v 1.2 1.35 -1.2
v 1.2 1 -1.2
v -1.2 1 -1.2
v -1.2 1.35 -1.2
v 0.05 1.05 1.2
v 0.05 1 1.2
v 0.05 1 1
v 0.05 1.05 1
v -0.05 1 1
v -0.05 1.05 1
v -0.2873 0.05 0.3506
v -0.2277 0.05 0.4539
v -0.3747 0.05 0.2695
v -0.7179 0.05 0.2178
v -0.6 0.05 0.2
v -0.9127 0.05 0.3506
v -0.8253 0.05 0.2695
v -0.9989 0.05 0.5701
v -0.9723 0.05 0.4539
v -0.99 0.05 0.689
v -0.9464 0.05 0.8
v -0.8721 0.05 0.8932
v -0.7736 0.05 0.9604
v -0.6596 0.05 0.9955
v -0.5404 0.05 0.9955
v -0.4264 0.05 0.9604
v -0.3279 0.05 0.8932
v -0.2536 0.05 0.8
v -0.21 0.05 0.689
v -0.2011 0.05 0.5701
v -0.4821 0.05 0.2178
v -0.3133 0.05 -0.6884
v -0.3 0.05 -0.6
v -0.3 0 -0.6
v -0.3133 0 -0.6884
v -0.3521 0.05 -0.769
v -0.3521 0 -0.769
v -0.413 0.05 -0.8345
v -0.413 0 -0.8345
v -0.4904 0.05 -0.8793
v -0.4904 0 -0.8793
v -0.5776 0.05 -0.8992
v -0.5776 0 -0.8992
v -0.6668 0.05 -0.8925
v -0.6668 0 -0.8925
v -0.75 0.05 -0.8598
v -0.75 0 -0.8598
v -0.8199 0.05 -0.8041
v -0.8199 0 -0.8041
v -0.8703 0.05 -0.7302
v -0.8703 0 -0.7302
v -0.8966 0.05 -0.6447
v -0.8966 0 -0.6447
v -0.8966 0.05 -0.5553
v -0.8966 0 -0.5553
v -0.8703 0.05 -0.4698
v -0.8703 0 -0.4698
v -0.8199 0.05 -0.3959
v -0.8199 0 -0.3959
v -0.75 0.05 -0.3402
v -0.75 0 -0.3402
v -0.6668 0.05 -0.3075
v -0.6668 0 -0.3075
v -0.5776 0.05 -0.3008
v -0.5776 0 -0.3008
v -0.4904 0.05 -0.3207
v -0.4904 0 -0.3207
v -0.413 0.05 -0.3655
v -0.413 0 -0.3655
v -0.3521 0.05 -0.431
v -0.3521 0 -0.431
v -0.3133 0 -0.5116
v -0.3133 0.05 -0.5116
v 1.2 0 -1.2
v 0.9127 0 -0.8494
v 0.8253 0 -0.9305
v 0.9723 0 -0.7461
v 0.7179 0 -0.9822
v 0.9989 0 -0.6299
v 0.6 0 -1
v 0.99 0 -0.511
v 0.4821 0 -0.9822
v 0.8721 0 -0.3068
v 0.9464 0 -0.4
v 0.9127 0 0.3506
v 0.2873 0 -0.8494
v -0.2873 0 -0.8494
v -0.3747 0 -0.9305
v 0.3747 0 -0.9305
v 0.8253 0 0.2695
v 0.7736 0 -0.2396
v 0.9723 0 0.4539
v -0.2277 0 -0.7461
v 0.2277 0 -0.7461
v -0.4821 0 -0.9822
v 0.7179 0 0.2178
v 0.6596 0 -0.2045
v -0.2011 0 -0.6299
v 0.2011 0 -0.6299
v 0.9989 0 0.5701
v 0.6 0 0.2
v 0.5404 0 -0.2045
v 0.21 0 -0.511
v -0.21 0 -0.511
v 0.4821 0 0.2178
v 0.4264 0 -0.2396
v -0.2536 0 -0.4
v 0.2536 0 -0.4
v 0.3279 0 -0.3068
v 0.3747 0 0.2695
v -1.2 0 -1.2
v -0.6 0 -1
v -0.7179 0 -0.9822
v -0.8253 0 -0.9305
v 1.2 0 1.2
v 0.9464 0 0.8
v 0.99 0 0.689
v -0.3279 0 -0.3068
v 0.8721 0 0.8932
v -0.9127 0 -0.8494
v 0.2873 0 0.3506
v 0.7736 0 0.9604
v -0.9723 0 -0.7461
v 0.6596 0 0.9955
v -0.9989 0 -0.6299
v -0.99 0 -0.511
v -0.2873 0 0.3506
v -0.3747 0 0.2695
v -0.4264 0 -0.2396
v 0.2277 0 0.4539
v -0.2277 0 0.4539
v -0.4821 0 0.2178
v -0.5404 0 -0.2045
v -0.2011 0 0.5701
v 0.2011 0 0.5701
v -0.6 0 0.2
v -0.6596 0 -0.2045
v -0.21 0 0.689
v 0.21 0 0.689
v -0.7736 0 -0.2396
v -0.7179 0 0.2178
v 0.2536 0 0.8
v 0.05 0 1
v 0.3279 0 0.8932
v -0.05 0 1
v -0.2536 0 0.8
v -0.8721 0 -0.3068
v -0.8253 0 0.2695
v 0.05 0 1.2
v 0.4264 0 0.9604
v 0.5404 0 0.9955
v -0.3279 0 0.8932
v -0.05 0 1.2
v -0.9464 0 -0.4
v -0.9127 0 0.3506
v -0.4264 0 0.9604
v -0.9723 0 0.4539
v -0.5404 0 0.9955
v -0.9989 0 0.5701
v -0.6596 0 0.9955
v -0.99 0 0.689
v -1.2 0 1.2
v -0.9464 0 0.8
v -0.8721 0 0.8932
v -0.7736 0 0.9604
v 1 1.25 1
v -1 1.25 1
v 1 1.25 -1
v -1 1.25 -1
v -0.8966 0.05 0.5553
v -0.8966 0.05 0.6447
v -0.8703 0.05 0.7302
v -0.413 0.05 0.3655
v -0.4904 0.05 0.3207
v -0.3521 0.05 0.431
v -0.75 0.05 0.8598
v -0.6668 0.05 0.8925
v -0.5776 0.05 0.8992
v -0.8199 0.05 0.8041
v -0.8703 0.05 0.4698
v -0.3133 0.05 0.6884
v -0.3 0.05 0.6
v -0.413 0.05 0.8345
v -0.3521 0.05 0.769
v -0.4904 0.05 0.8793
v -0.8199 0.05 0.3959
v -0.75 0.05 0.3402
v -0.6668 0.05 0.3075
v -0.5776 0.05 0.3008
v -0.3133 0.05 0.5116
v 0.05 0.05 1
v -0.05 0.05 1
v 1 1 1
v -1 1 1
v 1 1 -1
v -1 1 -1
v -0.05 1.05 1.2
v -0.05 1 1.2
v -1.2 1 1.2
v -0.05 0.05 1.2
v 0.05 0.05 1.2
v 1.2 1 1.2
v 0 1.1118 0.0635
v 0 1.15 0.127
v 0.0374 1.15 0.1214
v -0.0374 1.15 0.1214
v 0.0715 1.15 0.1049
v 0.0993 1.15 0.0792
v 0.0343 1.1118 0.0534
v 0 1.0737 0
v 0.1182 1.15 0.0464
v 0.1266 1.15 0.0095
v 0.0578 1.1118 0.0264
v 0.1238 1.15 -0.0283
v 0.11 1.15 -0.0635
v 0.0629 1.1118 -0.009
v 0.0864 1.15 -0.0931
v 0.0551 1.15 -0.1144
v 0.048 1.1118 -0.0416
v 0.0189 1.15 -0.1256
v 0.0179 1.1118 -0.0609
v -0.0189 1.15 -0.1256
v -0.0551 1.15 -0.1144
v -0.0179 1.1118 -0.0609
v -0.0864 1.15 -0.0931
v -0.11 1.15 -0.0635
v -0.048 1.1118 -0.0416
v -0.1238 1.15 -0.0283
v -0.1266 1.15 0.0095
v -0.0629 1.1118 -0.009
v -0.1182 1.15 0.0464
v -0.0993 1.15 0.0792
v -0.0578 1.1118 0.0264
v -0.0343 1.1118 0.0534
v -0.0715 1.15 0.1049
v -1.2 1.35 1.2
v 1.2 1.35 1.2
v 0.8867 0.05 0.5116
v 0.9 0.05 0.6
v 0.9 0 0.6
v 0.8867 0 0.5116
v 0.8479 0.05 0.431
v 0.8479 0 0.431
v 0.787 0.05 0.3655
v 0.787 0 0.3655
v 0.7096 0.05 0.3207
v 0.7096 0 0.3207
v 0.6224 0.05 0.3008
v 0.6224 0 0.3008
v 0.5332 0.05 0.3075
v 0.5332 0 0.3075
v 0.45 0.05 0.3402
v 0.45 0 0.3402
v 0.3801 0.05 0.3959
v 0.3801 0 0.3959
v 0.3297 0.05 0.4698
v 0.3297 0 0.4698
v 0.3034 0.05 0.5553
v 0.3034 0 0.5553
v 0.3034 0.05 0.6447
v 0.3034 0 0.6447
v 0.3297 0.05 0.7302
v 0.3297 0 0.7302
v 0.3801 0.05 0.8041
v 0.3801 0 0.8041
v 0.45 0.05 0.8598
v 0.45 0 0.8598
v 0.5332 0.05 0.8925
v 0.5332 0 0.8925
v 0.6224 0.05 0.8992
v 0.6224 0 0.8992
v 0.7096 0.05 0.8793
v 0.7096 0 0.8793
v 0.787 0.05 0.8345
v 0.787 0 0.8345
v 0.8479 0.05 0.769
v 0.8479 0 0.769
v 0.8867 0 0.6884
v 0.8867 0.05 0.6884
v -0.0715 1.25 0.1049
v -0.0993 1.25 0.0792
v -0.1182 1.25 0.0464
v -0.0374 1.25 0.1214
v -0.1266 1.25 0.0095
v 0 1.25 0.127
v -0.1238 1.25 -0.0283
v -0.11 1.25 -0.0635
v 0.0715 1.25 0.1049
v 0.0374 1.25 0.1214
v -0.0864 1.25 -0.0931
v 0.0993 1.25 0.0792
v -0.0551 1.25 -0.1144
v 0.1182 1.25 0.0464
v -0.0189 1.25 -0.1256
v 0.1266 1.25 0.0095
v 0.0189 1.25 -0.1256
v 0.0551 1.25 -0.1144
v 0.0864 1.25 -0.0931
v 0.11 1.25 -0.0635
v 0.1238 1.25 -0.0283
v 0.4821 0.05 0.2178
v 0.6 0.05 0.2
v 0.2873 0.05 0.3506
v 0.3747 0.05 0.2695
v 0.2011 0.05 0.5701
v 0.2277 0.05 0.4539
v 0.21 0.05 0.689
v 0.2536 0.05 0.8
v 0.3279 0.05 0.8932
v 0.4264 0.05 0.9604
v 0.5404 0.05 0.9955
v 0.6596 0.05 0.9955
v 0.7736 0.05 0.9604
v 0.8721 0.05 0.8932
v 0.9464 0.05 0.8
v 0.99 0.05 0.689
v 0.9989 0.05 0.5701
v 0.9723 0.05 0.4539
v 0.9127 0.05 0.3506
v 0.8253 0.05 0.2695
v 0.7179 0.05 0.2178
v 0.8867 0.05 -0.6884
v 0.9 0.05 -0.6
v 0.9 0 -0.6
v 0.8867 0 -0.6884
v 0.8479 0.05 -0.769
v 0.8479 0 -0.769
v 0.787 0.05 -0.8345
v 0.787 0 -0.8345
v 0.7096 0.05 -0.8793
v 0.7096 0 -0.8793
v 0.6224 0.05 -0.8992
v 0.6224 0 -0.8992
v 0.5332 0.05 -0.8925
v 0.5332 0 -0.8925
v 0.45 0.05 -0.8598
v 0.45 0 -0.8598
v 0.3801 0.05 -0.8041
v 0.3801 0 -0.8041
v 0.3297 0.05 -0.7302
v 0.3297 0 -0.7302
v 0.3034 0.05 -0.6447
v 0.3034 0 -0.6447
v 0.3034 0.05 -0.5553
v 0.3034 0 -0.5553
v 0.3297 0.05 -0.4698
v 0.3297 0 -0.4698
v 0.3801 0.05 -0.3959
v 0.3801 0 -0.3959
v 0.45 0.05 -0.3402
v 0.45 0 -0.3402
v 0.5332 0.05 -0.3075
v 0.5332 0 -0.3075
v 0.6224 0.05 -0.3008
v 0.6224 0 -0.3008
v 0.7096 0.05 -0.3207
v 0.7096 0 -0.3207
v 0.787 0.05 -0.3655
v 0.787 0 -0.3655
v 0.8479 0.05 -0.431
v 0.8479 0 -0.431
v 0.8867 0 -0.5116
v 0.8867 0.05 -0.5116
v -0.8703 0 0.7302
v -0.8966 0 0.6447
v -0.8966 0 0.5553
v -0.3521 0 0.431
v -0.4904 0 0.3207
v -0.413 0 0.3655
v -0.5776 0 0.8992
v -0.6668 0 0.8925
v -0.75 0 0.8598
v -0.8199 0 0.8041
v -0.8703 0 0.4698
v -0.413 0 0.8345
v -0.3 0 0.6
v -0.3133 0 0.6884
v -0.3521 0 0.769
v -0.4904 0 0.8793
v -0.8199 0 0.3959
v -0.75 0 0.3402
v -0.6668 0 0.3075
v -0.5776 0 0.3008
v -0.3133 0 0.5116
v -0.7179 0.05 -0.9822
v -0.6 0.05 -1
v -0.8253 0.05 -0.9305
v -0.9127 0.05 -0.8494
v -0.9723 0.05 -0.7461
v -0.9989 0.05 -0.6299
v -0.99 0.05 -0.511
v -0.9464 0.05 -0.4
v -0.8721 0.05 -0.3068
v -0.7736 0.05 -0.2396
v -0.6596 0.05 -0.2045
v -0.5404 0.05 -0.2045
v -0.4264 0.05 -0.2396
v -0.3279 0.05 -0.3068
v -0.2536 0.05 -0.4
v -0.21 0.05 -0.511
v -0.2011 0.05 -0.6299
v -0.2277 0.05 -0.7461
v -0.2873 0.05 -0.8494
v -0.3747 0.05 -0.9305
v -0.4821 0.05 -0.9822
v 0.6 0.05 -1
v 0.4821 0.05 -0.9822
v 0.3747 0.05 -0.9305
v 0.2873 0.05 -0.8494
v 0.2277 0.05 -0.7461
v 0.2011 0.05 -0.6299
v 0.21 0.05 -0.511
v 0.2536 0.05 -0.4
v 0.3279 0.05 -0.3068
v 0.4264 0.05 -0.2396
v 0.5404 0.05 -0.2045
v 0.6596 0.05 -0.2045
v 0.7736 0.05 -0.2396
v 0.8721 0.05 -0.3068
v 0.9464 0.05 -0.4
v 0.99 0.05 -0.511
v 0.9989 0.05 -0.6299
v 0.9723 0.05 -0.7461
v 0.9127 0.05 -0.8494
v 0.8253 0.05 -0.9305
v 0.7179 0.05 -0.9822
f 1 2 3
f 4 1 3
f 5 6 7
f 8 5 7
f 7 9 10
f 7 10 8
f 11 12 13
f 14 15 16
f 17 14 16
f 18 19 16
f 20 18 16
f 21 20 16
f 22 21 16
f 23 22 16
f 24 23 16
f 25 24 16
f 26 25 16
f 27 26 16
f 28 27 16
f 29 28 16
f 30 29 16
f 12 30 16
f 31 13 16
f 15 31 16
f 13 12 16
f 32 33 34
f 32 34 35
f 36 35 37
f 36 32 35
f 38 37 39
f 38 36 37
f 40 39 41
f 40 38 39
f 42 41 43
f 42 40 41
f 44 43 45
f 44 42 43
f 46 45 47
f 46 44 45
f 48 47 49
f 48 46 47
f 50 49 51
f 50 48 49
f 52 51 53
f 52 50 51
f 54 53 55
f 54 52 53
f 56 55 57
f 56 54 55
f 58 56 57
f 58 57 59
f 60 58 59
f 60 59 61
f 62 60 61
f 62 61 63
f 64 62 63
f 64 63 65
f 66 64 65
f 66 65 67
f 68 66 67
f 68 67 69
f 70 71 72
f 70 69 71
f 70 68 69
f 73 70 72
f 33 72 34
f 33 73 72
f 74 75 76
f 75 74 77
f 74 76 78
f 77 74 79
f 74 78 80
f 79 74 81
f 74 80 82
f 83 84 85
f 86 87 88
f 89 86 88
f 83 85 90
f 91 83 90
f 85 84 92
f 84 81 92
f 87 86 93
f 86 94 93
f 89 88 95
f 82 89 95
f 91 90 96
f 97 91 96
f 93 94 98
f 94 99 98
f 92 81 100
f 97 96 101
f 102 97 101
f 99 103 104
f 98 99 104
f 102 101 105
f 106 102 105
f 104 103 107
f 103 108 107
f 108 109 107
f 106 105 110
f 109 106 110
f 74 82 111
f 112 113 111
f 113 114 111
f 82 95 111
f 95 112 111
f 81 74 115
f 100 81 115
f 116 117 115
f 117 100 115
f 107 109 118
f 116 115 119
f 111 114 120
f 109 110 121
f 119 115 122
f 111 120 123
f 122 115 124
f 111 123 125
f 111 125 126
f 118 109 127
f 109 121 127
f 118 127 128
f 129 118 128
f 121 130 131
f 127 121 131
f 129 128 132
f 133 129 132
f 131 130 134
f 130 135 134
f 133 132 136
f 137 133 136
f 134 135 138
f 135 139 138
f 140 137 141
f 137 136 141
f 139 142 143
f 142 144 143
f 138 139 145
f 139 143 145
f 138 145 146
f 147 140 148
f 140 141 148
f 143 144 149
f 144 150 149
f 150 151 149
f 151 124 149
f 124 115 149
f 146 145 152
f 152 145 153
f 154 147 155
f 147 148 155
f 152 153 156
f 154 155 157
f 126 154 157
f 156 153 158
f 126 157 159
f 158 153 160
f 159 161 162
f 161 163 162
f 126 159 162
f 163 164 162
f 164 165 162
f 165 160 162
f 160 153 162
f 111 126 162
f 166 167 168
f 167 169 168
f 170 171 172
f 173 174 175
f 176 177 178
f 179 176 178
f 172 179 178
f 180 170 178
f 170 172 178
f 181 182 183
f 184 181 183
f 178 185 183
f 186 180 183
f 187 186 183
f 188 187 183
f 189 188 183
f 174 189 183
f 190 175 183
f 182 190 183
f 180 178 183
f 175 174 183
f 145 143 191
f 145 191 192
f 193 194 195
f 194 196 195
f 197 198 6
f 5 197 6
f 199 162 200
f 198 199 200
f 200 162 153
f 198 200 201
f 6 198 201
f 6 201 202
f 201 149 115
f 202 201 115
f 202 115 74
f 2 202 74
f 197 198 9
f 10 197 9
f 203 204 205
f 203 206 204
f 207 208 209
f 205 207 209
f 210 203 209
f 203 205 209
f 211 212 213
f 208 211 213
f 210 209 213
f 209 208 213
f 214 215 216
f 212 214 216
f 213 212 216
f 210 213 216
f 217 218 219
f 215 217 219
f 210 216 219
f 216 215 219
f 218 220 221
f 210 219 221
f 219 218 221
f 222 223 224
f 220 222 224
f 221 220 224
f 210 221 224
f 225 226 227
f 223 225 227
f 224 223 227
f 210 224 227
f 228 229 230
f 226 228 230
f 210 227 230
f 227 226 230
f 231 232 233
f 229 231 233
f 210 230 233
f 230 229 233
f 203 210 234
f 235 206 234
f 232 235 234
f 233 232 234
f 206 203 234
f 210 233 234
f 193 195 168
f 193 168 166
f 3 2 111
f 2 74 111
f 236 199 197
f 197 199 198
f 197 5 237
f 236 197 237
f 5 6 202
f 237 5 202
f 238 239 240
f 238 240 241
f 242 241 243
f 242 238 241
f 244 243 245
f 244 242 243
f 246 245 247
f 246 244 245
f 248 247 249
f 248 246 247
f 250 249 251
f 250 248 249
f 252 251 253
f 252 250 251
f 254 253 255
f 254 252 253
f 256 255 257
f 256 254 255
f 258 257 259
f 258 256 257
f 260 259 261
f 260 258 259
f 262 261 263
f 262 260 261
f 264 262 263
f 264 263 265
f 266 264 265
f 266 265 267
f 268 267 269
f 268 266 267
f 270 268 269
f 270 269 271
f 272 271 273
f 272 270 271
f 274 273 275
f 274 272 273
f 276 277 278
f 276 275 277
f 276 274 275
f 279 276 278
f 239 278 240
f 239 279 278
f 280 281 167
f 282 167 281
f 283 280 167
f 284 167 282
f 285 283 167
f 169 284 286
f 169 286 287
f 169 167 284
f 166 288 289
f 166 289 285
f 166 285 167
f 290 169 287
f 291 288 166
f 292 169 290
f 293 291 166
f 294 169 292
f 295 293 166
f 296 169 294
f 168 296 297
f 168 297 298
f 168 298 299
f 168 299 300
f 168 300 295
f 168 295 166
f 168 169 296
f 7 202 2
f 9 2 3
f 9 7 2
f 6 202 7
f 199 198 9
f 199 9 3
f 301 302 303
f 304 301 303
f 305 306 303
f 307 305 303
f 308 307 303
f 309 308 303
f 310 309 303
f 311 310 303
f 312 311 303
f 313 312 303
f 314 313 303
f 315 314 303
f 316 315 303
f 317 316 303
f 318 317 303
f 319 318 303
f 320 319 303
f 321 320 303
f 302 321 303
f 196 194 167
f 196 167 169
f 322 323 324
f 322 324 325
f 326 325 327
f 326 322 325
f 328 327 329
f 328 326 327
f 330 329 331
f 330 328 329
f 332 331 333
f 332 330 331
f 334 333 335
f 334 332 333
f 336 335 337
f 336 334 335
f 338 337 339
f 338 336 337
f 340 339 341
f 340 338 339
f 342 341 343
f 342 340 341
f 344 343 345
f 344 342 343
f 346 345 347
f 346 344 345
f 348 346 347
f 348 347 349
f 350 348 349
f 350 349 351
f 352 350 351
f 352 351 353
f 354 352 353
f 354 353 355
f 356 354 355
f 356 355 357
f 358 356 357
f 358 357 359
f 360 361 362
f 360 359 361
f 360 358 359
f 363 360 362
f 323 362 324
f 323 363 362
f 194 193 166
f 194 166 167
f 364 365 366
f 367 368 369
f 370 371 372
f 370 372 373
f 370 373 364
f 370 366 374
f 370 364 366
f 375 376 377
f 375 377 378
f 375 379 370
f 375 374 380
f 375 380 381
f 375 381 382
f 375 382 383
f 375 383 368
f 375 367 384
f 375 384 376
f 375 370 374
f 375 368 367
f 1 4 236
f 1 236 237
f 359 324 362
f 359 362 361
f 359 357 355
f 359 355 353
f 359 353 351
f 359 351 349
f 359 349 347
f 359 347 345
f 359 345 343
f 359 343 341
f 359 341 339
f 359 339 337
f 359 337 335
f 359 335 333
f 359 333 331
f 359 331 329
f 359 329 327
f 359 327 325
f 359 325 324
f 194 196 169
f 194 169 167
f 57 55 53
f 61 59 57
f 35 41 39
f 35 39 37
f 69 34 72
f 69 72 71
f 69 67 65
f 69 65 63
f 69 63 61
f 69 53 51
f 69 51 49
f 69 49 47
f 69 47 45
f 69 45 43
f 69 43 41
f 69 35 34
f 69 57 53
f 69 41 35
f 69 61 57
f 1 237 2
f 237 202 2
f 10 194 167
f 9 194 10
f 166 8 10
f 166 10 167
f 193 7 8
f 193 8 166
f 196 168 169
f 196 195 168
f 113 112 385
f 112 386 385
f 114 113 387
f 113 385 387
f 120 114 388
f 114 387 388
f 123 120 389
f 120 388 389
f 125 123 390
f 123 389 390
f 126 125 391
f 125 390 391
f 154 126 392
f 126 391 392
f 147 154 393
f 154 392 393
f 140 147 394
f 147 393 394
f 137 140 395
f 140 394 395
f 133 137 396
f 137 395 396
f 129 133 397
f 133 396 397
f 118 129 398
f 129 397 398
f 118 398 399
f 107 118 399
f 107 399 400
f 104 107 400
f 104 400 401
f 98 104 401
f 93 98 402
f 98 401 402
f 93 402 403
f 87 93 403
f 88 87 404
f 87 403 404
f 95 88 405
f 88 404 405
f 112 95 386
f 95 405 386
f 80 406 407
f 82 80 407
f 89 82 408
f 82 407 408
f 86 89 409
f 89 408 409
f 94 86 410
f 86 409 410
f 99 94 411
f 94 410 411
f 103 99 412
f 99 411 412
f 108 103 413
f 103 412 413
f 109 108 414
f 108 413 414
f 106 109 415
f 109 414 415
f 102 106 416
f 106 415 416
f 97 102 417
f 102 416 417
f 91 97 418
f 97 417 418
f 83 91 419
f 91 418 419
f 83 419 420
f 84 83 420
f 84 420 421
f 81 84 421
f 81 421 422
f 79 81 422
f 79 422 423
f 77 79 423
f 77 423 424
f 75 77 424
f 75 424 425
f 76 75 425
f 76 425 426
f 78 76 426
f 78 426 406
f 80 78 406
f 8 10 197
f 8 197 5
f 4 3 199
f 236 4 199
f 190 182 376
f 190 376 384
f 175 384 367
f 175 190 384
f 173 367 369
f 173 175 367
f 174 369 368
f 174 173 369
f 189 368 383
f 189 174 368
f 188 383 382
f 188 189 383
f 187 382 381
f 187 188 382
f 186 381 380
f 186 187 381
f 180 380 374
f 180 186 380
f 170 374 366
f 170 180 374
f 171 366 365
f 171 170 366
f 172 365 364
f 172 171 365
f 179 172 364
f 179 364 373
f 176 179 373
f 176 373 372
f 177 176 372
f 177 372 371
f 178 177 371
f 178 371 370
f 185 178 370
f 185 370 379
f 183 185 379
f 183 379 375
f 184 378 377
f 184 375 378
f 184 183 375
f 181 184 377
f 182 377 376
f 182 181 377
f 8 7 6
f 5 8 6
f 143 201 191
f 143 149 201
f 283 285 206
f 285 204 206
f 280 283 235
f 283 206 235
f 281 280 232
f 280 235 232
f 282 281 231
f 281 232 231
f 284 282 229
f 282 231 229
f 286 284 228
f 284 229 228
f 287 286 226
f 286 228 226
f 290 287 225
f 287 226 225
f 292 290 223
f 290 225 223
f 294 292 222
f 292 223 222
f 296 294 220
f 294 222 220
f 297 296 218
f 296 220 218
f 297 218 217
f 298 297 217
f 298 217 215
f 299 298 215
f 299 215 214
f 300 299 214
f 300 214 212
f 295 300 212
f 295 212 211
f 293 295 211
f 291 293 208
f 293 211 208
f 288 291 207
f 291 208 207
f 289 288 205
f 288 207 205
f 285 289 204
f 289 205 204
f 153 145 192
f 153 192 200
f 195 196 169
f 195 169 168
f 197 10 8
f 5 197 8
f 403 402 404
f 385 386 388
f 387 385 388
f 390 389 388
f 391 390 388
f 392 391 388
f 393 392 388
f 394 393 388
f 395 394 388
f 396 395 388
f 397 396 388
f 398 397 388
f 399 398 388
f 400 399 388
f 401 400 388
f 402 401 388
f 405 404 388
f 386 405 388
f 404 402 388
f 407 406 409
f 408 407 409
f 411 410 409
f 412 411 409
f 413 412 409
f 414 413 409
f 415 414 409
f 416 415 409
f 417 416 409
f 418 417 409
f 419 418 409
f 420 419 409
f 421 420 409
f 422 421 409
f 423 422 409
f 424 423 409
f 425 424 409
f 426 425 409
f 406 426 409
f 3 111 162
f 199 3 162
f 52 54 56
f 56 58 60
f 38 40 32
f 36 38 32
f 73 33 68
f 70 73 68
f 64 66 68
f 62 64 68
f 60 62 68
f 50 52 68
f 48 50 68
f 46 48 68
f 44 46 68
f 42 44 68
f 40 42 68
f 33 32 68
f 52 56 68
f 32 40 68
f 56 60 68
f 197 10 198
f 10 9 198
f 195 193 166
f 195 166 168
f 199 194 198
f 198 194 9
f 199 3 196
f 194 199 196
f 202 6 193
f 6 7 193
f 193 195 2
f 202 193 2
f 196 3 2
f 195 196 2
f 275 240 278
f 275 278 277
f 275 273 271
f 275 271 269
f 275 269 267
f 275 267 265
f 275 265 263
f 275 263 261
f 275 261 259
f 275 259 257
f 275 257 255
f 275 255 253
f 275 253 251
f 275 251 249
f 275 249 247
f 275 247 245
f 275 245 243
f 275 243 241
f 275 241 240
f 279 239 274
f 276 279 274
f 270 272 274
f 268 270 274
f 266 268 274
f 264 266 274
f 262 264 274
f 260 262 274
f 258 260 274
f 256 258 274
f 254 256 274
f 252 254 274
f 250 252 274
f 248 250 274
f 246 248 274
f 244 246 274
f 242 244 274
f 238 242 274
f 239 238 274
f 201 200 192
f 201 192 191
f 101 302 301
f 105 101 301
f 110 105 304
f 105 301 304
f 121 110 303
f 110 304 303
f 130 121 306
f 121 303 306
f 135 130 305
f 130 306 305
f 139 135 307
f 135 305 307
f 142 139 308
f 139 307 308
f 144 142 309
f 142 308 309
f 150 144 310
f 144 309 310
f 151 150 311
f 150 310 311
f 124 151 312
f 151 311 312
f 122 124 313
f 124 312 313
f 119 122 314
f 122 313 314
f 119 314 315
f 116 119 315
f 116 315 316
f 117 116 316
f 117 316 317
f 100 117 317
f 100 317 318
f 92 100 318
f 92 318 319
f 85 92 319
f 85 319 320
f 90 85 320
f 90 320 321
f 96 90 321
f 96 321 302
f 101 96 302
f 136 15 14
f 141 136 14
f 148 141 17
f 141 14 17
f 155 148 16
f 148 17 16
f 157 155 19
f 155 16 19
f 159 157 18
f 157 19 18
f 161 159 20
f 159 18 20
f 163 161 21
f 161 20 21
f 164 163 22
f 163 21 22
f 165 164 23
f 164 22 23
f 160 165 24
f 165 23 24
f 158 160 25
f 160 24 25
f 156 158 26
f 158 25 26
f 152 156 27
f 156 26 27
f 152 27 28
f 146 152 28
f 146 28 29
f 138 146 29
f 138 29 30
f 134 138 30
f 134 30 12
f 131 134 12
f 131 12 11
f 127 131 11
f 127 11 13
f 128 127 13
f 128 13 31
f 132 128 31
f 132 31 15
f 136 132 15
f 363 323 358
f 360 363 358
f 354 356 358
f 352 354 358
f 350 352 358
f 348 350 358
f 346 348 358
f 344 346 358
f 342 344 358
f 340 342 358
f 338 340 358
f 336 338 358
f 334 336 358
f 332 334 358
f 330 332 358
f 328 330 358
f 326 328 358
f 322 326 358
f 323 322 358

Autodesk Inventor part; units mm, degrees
ref_plane "YZ Plane" through (0, 0, 0) normal (1, 0, 0) x (0, 1, 0)
ref_plane "XZ Plane" through (0, 0, 0) normal (0, 1, 0) x (-1, 0, 0)
ref_plane "XY Plane" through (0, 0, 0) normal (0, 0, 1) x (1, 0, 0)
sketch "Sketch1" plane through (0, 0, 0) normal (0, 1, 0) x (-1, 0, 0)
  line L0 (1.2, 1.2) -> (-1.2, 1.2)
  line L1 (-1.2, 1.2) -> (-1.2, -1.2)
  line L2 (-1.2, -1.2) -> (1.2, -1.2)
  line L3 (1.2, -1.2) -> (1.2, 1.2)
  line L4 (1.2, 1.2) -> (-1.2, -1.2) construction
  line L5 (-1.2, 1.2) -> (1.2, -1.2) construction
  point P0 (0, 0)
  dimension "d0" = 2.4
  dimension "d1" = 2.4
extrude "Extrusion1" add sketch "Sketch1" along normal blind 1
sketch "Sketch2" plane through (0, 1, 0) normal (0, 1, 0) x (1, 0, 0)
  line L0 (1, -1) -> (-1, -1)
  line L1 (-1, -1) -> (-1, 1)
  line L2 (-1, 1) -> (1, 1)
  line L3 (1, 1) -> (1, -1)
  line L4 (1, -1) -> (-1, 1) construction
  line L5 (-1, -1) -> (1, 1) construction
  point P0 (0, 0)
  dimension "d4" = 2
  dimension "d5" = 2
extrude "Extrusion2" add sketch "Sketch2" along normal blind 0.25 separate body
sketch "Sketch8" plane through (0, 1, 0) normal (0, 1, 0) x (1, 0, 0)
  line L0 (-1.2, -1.2) -> (1.2, -1.2) projected
  line L1 (1.2, -1.2) -> (1.2, 1.2) projected
  line L2 (1.2, 1.2) -> (-1.2, 1.2) projected
  line L3 (-1.2, 1.2) -> (-1.2, -1.2) projected
  line L4 (-1, -1) -> (1, -1) projected
  line L5 (-0.05, -1.2) -> (0.05, -1.2)
  line L6 (0.05, -1.2) -> (0.05, -1)
  line L7 (0.05, -1) -> (-0.05, -1)
  line L8 (-0.05, -1) -> (-0.05, -1.2)
  point P0 (0, 0)
  point P1 (0, -1)
  dimension "d35" = 0.1
  dimension "d36" = 0.05
extrude "Extrusion6" add sketch "Sketch8" along normal blind 0.05 contours L8 L4 L6 L0 bodies 1
sketch "Sketch3" plane through (0, 1, 0) normal (0, 1, 0) x (1, 0, 0)
  line L0 (-1.2, -1.2) -> (-0.05, -1.2) projected
  line L1 (1.2, -1.2) -> (1.2, 1.2) projected
  line L2 (1.2, 1.2) -> (-1.2, 1.2) projected
  line L3 (-1.2, 1.2) -> (-1.2, -1.2) projected
  line L4 (-1, -1) -> (1, -1) projected
  line L5 (1, -1) -> (1, 1) projected
  line L6 (1, 1) -> (-1, 1) projected
  line L7 (-1, 1) -> (-1, -1) projected
  line L8 (0.05, -1) -> (0.05, -1.2) projected
  line L9 (0.05, -1.2) -> (1.2, -1.2) projected
  line L10 (-0.05, -1.2) -> (-0.05, -1) projected
  line L11 (-0.05, -1) -> (0.05, -1) projected
  point P0 (0, 0)
extrude "Extrusion3" add sketch "Sketch3" along normal blind 0.35 separate body contours L3 L2 L1 L9 L8 L4 L5 L6 L7 L10 L0
sketch "Sketch9" plane through (0, 1.05, 0) normal (0, 1, 0) x (1, 0, 0)
  point P0 (0, 0)
sketch "Sketch10" plane through (0, 1.35, 0) normal (0, 1, 0) x (1, 0, 0)
  line L0 (-0.05, -1.2) -> (0.05, -1.2) projected
  line L1 (0.05, -1.2) -> (0.05, -1) projected
  line L2 (0.05, -1) -> (-0.05, -1) projected
  line L3 (-0.05, -1) -> (-0.05, -1.2) projected
  point P0 (0, 0)
extrude "Extrusion7" add sketch "Sketch10" against normal up to surface (0.3 mm away) bodies 3
sketch "Sketch5" plane through (0, 1.25, 0) normal (0, 1, 0) x (1, 0, 0)
  point P0 (0, 0)
  point P1 (0, 0)
hole "Hole1" at (0, 1.25, 0) direction (0, -1, 0) diameter 0.254 depth 0.1 tip angle 118 bodies 2
sketch "Sketch4" plane through (0, 1.35, 0) normal (0, 1, 0) x (1, 0, 0)
  line L0 (-1, -1) -> (-1, 1) projected
  line L1 (-1, 1) -> (1, 1) projected
  line L2 (1, 1) -> (1, -1) projected
  line L3 (1, -1) -> (-1, -1) projected
  line L4 (1.2, -1.2) -> (1.2, 1.2) projected
  line L5 (1.2, 1.2) -> (-1.2, 1.2) projected
  line L6 (-1.2, 1.2) -> (-1.2, -1.2) projected
  line L7 (-1.2, -1.2) -> (1.2, -1.2) projected
  point P0 (0, 0)
extrude "Extrusion4" add sketch "Sketch4" against normal up to surface (0.1 mm away) contours L0 L1 L2 L3 bodies 3
sketch "Sketch6" plane through (0, 0, 0) normal (0, -1, 0) x (1, 0, 0)
  line L0 (0.6, 0.6) -> (-0.6, 0.6)
  line L1 (-0.6, 0.6) -> (-0.6, -0.6)
  line L2 (-0.6, -0.6) -> (0.6, -0.6)
  line L3 (0.6, -0.6) -> (0.6, 0.6)
  line L4 (0.6, 0.6) -> (-0.6, -0.6) construction
  line L5 (-0.6, 0.6) -> (0.6, -0.6) construction
  point P0 (0, 0)
  point P1 (0, 0)
  point P2 (0, 0)
  dimension "d19" = 1.2
  dimension "d20" = 1.2
hole "Hole2" at (0.6, 0, -0.6) at (-0.6, 0, -0.6) at (0.6, 0, 0.6) at (-0.6, 0, 0.6) direction (0, 1, 0) diameter 0.8 depth 0.05 bodies 1
sketch "Sketch11" plane through (0, 0, 0) normal (0, -1, 0) x (1, 0, 0)
  circle A0 centre (0.6, -0.6) radius 0.4 projected
  circle A1 centre (-0.6, -0.6) radius 0.4 projected
  circle A2 centre (0.6, 0.6) radius 0.4 projected
  line L0 (-1.2, 1.2) -> (1.2, 1.2) projected
  line L1 (-1.2, -1.2) -> (-1.2, 1.2) projected
  line L2 (1.2, -1.2) -> (-1.2, -1.2) projected
  line L3 (1.2, 1.2) -> (1.2, -1.2) projected
  line L4 (-0.05, 1.2) -> (0.05, 1.2)
  line L5 (0.05, 1.2) -> (0.05, 1)
  line L6 (0.05, 1) -> (-0.05, 1)
  line L7 (-0.05, 1) -> (-0.05, 1.2)
  point P0 (0, 0)
  point P1 (0, 1.2)
  dimension "d41" = 0.1
  dimension "d42" = 0.2
  dimension "d43" = 0.05
extrude "Extrusion8" cut sketch "Sketch11" against normal blind 0.05 contours L0 L5 L6 L7 bodies 1
sketch "Sketch12" plane through (0.6, 0.05, -0.6) normal (0, -1, 0) x (1, 0, 0)
  circle A0 centre (0, 0) radius 0.4 projected
  circle A1 centre (-1.2, 0) radius 0.4 projected
  circle A2 centre (0, 1.2) radius 0.4 projected
  circle A3 centre (-1.2, 1.2) radius 0.4 projected
  circle A4 centre (0, 0) radius 0.3
  circle A5 centre (-1.2, 0) radius 0.3
  circle A6 centre (-1.2, 1.2) radius 0.3
  circle A7 centre (0, 1.2) radius 0.3
  dimension "d46" = 0.6
extrude "Extrusion9" add sketch "Sketch12" along normal up to surface (0.05 mm away) separate body contours A4 | A5 | A6 | A7
properties part number "13360-30xxVE" material "ABS Plastic"
